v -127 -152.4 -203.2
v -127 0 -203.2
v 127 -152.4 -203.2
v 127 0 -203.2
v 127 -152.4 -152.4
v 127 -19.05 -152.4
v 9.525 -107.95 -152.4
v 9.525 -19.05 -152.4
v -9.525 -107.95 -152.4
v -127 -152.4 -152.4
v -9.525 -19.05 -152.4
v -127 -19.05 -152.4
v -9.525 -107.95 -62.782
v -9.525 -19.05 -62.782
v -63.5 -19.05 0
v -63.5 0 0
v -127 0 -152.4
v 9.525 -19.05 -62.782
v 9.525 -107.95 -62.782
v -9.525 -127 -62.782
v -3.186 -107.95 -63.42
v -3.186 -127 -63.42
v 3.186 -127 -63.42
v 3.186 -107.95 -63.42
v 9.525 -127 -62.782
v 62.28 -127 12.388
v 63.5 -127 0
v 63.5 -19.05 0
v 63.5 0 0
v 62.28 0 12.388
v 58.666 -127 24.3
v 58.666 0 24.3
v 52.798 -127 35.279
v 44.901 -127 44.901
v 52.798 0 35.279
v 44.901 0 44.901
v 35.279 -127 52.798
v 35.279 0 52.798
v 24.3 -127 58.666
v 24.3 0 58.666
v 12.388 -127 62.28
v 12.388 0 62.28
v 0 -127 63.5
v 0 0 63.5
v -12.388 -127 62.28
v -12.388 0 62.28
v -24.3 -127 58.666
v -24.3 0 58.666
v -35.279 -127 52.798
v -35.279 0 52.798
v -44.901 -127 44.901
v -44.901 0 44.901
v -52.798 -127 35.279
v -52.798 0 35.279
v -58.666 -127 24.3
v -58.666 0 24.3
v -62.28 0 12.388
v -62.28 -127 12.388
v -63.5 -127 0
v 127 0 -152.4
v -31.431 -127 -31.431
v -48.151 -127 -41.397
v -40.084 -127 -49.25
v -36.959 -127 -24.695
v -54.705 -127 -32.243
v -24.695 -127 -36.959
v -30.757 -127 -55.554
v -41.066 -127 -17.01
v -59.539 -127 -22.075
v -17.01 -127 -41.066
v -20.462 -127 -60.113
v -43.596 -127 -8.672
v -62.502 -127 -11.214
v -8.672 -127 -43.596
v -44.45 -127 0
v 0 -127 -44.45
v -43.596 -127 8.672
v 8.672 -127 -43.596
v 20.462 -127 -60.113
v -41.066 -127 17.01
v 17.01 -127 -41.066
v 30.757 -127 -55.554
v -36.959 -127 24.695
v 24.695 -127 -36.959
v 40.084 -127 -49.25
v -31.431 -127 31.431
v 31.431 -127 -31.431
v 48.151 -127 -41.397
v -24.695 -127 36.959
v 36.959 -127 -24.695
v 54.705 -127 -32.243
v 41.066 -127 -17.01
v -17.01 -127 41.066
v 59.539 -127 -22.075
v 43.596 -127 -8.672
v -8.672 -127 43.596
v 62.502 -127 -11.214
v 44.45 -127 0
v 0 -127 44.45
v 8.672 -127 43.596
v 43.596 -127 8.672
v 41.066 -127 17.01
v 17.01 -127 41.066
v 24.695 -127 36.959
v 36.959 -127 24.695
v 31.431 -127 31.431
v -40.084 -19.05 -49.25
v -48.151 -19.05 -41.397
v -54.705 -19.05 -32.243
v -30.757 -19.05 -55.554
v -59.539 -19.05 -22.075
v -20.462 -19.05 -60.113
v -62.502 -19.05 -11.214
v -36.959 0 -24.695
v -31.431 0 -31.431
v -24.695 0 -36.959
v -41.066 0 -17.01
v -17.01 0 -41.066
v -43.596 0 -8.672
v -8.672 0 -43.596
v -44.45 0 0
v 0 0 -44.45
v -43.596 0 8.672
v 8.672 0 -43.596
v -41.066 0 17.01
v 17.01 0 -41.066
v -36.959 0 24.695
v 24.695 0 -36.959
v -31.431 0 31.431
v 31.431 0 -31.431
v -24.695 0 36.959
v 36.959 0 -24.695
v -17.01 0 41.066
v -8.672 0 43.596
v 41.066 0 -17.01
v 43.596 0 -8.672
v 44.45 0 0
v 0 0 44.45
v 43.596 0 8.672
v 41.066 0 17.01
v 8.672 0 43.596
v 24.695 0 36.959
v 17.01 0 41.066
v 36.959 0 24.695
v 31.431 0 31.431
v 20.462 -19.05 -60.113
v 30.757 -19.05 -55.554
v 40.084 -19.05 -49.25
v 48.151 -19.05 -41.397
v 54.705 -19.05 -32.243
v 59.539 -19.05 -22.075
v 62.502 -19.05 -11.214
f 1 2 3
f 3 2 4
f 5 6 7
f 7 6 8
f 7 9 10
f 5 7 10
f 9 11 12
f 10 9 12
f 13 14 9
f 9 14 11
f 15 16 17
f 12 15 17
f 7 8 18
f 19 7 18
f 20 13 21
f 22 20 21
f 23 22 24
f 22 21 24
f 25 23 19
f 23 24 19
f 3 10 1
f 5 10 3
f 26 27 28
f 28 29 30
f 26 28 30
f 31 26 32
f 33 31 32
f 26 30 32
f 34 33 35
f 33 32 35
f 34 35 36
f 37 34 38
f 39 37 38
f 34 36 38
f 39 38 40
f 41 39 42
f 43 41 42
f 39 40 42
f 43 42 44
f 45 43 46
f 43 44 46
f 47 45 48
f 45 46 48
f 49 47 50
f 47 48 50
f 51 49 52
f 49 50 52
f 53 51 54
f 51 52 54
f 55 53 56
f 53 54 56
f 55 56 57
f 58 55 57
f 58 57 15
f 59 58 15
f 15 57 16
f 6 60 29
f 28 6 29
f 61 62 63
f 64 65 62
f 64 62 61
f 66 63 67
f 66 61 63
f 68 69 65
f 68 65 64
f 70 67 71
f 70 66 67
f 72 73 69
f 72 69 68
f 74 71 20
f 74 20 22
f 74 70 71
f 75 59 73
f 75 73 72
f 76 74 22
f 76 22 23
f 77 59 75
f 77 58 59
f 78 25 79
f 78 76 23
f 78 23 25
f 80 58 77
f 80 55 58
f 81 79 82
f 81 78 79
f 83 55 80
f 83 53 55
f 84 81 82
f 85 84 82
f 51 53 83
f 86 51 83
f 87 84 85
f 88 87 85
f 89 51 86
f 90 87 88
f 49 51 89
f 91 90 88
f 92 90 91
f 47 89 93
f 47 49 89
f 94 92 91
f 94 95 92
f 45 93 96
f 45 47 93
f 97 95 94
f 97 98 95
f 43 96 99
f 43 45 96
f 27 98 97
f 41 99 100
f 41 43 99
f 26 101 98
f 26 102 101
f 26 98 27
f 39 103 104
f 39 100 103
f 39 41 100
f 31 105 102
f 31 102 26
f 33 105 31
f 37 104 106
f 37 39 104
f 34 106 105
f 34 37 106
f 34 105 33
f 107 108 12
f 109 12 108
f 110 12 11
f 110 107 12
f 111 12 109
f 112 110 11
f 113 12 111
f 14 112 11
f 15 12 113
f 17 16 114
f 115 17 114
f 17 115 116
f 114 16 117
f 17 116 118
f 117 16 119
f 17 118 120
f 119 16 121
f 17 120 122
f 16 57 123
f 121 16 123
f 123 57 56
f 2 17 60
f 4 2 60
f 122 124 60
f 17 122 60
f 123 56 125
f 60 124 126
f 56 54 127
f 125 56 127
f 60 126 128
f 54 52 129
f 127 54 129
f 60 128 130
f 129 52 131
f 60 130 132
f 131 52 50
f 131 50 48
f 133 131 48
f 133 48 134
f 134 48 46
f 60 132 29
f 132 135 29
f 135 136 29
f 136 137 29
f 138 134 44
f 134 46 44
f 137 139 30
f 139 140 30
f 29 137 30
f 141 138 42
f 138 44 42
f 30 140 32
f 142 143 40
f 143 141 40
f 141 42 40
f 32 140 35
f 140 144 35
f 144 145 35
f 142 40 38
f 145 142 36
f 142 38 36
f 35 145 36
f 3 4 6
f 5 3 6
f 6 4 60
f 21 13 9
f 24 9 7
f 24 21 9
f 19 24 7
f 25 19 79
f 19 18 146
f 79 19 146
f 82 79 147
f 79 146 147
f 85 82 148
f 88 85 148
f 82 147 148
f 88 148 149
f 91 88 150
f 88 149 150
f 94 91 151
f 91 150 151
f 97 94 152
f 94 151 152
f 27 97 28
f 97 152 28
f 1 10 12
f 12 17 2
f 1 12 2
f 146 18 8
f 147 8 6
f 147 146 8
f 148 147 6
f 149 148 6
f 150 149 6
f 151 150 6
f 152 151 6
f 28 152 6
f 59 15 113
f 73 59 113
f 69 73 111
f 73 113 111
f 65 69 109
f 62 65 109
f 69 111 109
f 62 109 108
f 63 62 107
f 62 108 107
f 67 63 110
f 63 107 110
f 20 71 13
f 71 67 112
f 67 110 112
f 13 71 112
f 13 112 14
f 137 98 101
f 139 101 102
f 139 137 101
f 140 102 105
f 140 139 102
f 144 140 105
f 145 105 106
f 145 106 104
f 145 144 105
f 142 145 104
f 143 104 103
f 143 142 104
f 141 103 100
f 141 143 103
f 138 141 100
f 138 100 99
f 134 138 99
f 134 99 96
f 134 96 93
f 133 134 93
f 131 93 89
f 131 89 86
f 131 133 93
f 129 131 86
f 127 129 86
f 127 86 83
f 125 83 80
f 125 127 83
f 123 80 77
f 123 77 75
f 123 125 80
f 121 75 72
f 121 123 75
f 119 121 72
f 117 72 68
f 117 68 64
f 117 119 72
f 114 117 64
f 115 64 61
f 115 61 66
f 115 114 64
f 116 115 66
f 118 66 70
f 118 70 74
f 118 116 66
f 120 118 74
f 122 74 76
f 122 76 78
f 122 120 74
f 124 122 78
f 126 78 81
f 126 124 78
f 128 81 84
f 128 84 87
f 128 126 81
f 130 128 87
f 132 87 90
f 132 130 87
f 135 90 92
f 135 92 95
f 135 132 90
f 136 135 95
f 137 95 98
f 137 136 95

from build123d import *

# Parameters (mm, degrees)
F1_DEPTH = 152.4
F2_DEPTH = 107.95
F0_R     = 44.45
F3_DEPTH = 127
F4_DEPTH = 19.05


with BuildPart() as f1:
    # F0 (on Front) → F1 (new body)
    with BuildSketch(Plane.XZ):
        Polygon((127, -203.2), (127, -152.4), (9.525, -152.4), (-9.525, -152.4), (-127, -152.4), (-127, -203.2), align=None)
    extrude(amount=F1_DEPTH)

    # F0 (on Front) → F2 (join)
    with BuildSketch(Plane.XZ):
        with BuildLine():
            Line((9.525, -152.4), (9.525, -62.781561))
            ThreePointArc((9.525, -62.781561), (0, -63.5), (-9.525, -62.781561))
            Line((-9.525, -62.781561), (-9.525, -152.4))
            Line((-9.525, -152.4), (9.525, -152.4))
        make_face()
    extrude(amount=F2_DEPTH)

    # F0 (on Front) → F3 (join)
    with BuildSketch(Plane.XZ):
        with BuildLine():
            ThreePointArc((9.525, -62.781561), (48.151259, -41.396935), (63.5, 0))
            ThreePointArc((63.5, 0), (0, 63.5), (-63.5, 0))
            ThreePointArc((-63.5, 0), (-48.151259, -41.396935), (-9.525, -62.781561))
            ThreePointArc((-9.525, -62.781561), (0, -63.5), (9.525, -62.781561))
        make_face()
        Circle(F0_R, mode=Mode.SUBTRACT)
    extrude(amount=F3_DEPTH)

    # F0 (on Front) → F4 (join)
    with BuildSketch(Plane.XZ):
        with BuildLine():
            ThreePointArc((-9.525, -62.781561), (-48.151259, -41.396935), (-63.5, 0))
            Line((-63.5, 0), (-127, -152.4))
            Line((-127, -152.4), (-9.525, -152.4))
            Line((-9.525, -152.4), (-9.525, -62.781561))
        make_face()
        with BuildLine():
            Line((127, -152.4), (63.5, 0))
            ThreePointArc((63.5, 0), (48.151259, -41.396935), (9.525, -62.781561))
            Line((9.525, -62.781561), (9.525, -152.4))
            Line((9.525, -152.4), (127, -152.4))
        make_face()
    extrude(amount=F4_DEPTH)


solid = f1.part
